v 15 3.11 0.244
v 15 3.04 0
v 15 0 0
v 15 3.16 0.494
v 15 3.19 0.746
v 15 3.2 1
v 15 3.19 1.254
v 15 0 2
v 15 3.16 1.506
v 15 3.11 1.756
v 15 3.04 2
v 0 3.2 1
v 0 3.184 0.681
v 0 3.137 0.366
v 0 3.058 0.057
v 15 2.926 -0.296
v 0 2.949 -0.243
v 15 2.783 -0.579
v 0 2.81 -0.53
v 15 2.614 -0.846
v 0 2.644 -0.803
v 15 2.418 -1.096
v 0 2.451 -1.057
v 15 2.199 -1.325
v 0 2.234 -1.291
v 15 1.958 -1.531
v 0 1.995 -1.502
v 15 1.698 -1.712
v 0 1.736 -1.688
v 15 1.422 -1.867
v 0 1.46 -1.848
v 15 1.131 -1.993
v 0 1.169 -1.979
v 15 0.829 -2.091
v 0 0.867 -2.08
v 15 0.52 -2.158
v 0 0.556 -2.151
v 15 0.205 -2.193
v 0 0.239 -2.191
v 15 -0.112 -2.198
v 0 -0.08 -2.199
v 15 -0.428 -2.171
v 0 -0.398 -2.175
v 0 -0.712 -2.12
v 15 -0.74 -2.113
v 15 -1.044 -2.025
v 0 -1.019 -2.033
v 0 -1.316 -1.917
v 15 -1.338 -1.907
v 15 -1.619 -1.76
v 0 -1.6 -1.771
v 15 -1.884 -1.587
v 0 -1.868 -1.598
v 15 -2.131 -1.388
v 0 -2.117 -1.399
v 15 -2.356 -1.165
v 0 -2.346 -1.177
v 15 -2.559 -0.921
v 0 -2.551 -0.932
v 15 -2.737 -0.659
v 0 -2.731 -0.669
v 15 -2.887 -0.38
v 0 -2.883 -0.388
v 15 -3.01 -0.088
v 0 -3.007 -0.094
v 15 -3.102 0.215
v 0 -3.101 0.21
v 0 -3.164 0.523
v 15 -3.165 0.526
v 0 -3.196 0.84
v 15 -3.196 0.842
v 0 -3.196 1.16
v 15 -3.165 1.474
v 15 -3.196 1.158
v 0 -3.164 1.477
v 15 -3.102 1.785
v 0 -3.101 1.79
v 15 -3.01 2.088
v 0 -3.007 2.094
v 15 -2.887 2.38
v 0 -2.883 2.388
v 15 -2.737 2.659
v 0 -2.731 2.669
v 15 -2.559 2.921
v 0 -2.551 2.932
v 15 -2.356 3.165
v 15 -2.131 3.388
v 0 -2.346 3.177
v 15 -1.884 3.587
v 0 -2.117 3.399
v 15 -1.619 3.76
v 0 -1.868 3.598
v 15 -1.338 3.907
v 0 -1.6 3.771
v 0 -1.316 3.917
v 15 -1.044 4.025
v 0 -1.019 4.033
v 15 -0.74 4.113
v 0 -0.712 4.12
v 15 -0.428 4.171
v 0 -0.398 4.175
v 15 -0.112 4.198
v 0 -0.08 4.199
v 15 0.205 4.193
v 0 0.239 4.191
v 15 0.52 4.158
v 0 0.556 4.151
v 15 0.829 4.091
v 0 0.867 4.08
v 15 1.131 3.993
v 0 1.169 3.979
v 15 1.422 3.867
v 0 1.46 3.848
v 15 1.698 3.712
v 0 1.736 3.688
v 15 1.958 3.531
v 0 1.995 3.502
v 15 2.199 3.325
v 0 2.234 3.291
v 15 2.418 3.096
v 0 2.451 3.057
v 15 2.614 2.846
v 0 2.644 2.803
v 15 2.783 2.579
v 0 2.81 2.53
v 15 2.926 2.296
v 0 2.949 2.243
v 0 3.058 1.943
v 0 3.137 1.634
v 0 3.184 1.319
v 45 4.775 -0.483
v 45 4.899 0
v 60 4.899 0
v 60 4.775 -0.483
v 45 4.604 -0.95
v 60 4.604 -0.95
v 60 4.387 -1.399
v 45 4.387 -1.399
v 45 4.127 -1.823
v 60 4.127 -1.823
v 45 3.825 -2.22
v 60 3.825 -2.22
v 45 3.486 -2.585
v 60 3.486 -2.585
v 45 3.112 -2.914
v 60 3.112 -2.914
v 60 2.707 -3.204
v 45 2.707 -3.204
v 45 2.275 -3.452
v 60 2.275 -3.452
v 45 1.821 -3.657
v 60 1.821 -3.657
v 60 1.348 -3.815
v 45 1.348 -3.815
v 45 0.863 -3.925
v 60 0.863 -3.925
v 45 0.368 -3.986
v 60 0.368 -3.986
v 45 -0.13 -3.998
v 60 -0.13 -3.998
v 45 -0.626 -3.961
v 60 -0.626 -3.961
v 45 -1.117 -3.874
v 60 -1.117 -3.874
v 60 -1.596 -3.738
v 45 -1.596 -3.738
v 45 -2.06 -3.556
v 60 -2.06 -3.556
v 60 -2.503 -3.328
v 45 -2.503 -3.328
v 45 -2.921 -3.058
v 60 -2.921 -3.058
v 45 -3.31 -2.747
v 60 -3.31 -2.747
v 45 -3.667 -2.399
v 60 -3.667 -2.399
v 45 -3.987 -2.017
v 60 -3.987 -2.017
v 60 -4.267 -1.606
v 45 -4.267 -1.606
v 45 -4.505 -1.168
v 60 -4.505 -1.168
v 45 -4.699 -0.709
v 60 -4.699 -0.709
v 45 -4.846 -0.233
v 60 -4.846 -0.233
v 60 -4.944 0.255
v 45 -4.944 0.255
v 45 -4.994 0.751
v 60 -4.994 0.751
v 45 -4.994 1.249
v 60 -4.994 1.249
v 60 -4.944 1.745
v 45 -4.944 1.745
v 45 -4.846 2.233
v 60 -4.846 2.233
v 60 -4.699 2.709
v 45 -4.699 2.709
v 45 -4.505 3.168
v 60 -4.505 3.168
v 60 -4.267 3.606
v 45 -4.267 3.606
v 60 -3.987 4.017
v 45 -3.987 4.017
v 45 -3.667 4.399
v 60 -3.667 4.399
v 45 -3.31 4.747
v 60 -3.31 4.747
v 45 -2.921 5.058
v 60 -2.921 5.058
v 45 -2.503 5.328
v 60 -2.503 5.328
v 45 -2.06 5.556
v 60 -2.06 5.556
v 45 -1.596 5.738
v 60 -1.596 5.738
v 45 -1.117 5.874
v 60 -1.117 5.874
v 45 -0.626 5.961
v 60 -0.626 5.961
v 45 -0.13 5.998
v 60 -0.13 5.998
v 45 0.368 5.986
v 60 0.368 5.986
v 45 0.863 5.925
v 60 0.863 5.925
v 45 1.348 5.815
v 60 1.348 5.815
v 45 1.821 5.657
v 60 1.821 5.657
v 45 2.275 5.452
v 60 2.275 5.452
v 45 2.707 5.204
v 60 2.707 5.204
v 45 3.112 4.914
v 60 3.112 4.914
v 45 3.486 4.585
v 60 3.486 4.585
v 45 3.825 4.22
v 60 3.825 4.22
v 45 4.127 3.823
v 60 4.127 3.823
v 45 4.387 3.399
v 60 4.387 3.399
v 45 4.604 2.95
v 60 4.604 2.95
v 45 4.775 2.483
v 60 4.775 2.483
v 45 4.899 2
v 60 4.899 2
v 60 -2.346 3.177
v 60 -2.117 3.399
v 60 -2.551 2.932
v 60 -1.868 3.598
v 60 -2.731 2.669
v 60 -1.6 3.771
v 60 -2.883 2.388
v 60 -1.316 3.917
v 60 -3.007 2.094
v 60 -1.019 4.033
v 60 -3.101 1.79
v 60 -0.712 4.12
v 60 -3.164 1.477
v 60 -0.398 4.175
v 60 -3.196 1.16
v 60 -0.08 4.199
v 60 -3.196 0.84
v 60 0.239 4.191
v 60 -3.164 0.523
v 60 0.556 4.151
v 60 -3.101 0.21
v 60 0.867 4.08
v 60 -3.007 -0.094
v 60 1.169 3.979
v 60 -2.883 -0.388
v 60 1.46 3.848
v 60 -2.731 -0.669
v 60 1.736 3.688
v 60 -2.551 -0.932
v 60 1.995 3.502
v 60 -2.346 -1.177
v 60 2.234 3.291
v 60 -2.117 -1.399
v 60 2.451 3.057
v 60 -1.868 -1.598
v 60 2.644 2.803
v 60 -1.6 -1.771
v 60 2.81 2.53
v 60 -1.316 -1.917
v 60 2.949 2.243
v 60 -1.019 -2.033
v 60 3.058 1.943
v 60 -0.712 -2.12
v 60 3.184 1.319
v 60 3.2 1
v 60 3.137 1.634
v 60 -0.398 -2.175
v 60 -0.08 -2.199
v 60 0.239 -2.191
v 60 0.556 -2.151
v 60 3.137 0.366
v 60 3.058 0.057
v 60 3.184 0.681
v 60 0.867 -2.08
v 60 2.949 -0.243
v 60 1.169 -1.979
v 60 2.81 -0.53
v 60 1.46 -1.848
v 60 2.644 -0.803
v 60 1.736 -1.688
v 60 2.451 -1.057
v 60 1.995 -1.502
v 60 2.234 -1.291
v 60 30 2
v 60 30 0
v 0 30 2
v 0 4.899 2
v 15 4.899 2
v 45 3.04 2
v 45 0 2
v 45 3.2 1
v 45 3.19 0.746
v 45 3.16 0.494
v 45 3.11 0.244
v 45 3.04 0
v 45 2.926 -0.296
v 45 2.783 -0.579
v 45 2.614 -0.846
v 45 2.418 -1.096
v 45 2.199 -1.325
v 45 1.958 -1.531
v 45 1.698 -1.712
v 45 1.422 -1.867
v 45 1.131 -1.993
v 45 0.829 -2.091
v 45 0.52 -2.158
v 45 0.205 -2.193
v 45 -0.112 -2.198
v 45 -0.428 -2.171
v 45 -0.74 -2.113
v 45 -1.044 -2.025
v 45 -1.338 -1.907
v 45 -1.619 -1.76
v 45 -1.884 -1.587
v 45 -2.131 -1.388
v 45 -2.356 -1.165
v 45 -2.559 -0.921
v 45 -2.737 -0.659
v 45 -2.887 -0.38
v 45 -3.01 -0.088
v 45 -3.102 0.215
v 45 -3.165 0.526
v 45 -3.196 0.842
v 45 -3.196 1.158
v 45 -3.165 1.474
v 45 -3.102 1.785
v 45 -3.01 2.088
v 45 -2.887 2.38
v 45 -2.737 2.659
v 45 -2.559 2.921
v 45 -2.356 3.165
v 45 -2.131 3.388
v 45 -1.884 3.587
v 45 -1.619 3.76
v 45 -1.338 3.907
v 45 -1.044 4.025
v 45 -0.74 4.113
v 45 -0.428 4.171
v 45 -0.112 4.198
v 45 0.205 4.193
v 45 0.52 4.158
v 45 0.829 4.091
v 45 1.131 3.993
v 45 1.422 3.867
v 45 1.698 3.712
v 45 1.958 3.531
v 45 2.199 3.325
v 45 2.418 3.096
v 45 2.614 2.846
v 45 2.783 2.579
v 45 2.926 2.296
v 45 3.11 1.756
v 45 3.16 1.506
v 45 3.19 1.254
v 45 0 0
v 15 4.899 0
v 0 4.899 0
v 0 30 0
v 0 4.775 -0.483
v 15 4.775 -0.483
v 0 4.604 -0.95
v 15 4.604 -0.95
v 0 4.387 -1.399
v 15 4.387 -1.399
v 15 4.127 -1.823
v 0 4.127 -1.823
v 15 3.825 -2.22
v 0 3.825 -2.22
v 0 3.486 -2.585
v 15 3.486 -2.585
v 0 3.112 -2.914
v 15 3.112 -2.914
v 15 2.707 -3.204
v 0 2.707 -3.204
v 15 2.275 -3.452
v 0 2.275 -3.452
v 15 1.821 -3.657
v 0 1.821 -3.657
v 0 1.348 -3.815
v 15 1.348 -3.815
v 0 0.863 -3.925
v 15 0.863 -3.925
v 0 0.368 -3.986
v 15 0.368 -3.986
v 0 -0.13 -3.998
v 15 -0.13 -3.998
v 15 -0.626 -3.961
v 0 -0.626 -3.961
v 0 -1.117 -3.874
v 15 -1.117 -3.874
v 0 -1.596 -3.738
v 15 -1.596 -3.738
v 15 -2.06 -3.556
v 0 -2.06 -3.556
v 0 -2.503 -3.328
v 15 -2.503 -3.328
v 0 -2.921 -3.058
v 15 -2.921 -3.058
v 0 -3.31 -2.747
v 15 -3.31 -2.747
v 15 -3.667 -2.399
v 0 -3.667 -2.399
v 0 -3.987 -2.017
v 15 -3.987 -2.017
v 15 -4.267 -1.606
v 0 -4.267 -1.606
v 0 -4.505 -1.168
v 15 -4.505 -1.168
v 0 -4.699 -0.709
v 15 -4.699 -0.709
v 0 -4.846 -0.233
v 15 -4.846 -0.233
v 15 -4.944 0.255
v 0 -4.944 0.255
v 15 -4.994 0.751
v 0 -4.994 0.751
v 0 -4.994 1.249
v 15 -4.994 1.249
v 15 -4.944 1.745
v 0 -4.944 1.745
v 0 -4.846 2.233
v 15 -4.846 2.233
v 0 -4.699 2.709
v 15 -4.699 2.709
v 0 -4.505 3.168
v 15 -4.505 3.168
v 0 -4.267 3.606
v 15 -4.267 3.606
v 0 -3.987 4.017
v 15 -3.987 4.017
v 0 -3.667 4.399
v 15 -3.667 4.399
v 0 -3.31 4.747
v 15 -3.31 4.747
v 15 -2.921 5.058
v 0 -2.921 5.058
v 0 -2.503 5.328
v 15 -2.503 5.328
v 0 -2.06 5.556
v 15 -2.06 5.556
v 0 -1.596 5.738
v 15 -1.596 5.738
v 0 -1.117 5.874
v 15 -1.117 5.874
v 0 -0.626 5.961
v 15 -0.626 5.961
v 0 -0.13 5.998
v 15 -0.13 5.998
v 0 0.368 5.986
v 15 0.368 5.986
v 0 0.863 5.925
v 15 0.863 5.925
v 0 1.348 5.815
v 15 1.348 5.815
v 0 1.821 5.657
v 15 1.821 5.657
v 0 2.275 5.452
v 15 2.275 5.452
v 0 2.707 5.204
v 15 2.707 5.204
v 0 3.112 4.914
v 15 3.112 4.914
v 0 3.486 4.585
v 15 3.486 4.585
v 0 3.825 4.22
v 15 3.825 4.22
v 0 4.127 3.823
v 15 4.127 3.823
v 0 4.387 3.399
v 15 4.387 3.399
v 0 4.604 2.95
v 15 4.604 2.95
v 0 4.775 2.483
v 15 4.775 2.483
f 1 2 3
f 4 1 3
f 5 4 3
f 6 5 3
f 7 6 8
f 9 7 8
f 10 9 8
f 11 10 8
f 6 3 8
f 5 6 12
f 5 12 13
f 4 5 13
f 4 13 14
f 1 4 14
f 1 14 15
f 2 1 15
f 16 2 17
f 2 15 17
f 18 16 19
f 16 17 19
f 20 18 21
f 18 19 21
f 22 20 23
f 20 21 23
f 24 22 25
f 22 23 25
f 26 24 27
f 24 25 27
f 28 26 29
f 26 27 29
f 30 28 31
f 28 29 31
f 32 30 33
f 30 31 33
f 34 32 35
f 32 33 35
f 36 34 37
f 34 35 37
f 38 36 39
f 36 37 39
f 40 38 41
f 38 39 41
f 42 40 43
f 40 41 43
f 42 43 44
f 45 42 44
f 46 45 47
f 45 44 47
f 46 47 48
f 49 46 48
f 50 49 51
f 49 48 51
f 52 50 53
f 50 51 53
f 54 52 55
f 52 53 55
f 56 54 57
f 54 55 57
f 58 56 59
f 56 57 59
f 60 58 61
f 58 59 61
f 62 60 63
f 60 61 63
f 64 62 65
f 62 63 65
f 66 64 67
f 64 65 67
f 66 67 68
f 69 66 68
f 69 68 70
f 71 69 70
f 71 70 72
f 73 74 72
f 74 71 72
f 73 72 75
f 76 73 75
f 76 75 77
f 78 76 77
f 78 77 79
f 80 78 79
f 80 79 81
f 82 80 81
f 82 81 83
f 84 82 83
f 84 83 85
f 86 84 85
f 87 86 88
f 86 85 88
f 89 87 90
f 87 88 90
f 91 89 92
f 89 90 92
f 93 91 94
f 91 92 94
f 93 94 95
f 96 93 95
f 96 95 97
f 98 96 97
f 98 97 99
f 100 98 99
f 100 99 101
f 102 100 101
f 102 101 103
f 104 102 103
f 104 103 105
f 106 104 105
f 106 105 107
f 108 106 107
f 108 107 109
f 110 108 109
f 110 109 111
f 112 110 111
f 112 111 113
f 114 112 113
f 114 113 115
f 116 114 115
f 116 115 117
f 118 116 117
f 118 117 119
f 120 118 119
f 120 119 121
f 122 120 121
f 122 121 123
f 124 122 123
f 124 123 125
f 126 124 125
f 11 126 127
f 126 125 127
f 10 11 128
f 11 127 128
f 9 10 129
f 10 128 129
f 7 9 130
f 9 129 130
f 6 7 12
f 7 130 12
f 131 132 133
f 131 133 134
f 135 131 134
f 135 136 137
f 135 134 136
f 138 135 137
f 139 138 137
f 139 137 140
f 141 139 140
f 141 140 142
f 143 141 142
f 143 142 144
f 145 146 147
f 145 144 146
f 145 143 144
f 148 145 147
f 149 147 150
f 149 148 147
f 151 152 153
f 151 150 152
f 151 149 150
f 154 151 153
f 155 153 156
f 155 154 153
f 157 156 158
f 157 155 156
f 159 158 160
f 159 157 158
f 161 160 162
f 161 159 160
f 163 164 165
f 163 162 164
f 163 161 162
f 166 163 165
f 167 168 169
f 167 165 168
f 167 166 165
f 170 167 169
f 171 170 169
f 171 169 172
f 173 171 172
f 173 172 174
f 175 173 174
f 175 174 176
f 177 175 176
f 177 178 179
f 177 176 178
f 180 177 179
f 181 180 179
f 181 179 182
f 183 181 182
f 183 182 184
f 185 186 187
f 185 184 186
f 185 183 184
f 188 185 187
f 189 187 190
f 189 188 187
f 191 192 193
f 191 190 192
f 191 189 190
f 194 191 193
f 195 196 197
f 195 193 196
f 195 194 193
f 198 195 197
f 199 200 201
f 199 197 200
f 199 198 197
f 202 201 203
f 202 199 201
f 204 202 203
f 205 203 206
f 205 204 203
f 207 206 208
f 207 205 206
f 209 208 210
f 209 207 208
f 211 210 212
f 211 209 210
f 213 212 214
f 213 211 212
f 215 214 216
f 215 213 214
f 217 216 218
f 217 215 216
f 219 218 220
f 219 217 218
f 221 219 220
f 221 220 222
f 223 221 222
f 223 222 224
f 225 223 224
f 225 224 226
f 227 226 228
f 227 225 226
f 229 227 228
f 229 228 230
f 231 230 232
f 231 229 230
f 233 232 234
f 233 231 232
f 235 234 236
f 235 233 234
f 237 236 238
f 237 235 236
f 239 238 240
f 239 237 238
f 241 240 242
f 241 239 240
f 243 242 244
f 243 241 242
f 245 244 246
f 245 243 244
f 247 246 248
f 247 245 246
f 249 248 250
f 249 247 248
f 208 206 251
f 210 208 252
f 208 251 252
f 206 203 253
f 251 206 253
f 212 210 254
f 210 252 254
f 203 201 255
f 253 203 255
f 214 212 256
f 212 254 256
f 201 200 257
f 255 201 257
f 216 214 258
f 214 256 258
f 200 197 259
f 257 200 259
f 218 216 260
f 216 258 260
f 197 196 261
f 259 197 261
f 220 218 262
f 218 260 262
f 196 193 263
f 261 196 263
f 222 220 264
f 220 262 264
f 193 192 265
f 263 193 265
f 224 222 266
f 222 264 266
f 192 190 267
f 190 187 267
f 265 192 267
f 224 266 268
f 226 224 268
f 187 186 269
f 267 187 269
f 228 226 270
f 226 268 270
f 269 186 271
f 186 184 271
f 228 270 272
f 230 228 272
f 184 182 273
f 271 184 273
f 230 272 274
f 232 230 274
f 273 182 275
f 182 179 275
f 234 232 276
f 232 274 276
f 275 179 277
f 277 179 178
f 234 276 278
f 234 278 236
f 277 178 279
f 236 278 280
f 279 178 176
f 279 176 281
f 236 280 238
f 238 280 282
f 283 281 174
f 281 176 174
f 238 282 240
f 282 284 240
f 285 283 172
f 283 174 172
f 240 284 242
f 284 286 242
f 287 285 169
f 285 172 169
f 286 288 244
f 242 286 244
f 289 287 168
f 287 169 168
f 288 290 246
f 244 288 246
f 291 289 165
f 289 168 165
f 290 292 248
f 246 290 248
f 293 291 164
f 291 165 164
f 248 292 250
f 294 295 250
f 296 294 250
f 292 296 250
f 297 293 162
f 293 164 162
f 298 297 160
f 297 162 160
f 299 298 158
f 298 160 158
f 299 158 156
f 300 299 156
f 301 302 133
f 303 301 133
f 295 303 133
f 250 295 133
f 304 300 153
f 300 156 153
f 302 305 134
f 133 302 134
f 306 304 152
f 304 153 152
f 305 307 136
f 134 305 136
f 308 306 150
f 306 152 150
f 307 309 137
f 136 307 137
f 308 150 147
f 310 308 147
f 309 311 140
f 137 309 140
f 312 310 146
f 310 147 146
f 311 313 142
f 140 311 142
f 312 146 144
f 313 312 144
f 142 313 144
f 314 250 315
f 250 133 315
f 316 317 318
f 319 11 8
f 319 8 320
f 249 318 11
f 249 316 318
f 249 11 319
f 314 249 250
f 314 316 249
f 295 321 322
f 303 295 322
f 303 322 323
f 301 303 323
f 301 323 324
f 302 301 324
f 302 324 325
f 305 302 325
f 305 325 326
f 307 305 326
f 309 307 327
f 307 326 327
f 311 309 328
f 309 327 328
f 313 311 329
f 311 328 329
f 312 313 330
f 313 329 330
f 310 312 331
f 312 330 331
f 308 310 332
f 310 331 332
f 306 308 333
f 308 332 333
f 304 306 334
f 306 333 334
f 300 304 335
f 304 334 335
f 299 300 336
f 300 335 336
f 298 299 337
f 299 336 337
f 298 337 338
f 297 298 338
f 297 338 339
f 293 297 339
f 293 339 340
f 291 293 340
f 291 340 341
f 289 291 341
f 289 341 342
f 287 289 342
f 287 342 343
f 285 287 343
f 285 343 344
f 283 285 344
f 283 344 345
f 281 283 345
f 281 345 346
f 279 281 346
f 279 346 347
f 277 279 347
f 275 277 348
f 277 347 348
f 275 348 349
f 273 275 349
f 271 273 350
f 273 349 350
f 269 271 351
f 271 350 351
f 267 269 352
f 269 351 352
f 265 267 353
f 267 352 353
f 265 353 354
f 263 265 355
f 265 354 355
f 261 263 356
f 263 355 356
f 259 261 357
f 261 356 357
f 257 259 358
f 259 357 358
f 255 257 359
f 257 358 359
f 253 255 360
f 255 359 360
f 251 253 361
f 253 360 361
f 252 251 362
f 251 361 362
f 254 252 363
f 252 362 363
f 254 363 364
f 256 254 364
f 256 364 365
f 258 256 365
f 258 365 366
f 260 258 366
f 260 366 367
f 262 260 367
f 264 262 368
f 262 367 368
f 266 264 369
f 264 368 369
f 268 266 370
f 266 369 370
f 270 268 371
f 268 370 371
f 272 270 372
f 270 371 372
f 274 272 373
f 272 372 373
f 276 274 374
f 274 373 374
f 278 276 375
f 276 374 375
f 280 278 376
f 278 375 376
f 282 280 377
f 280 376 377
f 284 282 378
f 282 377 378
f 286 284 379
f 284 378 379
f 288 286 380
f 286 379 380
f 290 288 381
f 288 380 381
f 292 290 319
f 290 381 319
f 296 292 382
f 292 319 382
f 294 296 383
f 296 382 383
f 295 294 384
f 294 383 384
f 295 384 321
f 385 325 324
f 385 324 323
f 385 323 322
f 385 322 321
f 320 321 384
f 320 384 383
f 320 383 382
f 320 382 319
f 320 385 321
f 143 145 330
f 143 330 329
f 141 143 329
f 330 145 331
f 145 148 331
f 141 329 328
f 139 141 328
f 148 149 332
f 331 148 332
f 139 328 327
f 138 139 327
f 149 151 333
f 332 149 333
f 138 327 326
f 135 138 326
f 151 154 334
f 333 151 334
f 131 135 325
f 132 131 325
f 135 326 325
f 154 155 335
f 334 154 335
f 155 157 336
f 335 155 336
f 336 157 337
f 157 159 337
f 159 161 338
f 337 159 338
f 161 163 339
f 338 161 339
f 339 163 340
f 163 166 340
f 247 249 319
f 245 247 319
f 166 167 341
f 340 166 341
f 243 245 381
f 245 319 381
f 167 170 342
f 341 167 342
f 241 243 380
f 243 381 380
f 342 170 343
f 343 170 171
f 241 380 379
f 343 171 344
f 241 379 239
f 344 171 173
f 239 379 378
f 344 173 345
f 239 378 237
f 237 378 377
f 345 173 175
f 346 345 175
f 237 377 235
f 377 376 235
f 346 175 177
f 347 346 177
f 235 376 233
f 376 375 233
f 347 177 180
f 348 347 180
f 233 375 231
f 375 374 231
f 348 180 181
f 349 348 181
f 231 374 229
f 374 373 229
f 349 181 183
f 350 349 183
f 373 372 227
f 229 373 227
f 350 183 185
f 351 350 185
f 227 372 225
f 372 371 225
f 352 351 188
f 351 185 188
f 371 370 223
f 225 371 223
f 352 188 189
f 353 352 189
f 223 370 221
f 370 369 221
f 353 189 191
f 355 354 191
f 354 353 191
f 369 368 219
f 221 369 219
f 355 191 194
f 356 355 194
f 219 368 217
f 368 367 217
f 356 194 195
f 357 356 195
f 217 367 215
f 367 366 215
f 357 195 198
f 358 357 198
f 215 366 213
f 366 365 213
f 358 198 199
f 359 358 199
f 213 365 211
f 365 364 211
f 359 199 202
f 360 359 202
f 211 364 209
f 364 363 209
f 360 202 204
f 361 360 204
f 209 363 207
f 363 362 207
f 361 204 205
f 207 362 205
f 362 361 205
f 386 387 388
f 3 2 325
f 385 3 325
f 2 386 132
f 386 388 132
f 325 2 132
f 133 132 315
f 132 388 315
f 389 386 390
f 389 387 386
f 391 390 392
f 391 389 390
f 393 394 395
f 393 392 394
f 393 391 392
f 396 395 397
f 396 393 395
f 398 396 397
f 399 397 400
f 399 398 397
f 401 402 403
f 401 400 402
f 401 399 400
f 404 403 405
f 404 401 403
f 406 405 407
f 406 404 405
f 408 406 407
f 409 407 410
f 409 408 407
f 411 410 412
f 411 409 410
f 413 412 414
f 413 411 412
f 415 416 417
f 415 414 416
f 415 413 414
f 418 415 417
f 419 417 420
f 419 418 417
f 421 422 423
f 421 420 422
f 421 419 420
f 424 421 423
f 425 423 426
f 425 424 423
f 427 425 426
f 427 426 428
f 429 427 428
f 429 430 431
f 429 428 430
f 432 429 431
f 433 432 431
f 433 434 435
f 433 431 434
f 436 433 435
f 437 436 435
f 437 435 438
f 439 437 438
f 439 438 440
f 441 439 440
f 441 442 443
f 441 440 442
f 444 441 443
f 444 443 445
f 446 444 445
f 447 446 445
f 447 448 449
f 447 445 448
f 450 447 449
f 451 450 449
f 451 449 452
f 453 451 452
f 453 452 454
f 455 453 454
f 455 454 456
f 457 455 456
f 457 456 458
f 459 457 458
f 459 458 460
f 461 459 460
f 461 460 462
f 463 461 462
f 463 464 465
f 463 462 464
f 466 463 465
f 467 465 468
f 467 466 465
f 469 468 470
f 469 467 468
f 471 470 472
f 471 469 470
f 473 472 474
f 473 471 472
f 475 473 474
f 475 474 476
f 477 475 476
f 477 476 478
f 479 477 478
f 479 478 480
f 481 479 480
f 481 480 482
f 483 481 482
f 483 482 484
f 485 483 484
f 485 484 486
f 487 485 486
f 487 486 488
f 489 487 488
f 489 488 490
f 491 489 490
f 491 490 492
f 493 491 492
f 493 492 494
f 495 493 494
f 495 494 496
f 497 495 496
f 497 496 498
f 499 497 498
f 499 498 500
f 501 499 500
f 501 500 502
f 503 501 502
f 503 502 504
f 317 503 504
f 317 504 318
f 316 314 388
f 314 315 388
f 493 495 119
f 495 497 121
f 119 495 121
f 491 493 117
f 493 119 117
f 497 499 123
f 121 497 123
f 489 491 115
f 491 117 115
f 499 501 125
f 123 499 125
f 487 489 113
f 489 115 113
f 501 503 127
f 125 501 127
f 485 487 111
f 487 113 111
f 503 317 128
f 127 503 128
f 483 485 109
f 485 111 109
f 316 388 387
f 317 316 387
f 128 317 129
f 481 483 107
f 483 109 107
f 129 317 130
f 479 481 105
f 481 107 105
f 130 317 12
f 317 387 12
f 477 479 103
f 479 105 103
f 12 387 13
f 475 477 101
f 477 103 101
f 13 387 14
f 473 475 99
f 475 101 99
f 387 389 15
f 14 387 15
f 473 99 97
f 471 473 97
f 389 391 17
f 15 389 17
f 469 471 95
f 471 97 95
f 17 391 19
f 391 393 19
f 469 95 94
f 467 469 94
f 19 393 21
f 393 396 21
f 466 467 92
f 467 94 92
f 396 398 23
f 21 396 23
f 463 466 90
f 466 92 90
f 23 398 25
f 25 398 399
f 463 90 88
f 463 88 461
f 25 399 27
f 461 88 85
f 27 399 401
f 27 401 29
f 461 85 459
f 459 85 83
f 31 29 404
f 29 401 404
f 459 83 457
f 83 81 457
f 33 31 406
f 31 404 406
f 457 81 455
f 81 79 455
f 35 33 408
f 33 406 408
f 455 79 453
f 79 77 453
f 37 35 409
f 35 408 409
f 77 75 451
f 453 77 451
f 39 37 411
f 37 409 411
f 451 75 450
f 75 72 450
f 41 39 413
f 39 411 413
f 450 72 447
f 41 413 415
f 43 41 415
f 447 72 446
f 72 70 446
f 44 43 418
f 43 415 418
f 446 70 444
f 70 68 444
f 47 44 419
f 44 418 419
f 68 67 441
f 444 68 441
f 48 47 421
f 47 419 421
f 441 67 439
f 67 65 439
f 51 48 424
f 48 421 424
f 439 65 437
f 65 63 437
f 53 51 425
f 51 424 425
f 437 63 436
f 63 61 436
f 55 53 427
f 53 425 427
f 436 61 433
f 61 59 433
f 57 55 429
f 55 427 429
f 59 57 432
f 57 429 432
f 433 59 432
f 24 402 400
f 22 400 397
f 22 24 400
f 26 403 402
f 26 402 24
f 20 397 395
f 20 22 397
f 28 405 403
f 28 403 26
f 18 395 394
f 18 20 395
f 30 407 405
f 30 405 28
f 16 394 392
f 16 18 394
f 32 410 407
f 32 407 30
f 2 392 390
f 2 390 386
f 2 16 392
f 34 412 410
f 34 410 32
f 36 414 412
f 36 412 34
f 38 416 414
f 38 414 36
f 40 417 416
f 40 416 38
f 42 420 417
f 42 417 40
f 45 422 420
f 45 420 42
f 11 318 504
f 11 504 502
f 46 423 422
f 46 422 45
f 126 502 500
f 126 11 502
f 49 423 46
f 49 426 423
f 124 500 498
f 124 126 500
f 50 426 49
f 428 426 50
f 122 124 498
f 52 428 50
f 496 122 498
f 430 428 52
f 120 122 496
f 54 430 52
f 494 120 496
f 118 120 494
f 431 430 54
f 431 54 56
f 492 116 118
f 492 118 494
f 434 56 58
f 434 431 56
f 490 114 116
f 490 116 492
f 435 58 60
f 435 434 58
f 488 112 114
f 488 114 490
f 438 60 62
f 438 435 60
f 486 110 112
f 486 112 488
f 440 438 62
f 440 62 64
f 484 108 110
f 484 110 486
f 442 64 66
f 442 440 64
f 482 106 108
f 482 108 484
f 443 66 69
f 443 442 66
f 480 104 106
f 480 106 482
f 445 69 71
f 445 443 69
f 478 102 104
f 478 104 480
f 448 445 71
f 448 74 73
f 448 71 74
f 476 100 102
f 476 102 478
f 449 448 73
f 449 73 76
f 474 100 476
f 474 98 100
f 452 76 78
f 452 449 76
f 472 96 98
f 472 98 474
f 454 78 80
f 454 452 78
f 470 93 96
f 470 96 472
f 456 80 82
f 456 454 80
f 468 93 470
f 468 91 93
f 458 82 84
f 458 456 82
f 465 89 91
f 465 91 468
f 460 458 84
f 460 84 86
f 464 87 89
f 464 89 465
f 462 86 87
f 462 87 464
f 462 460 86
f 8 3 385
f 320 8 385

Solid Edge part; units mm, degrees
sketch "Sketch1" plane through (0, 0, 0) normal (0, 0, 1) x (1, 0, 0)
  line L0 (0, 0) -> (60, 0)
  line L1 (60, 0) -> (60, 30)
  line L2 (60, 30) -> (0, 30)
  line L3 (0, 30) -> (0, 0)
extrude "Protrusion1" add sketch "Sketch1" along normal blind 2
sketch "Sketch2" plane through (0, 0, 0) normal (1, 0, 0) x (0, 1, 0)
  circle A0 centre (0, 1) radius 5
extrude "拉伸_2" add sketch "Sketch2" along normal blind 15
sketch "Sketch3" plane through (45, 0, 0) normal (1, 0, 0) x (0, 1, 0)
  circle A0 centre (0, 1) radius 5
extrude "拉伸_3" add sketch "Sketch3" along normal blind 15
sketch "Sketch4" plane through (0, 0, 0) normal (1, 0, 0) x (0, 1, 0)
  circle A0 centre (0, 1) radius 3.2
extrude "拉伸除料_1" cut sketch "Sketch4" along normal blind 15
sketch "Sketch5" plane through (45, 0, 0) normal (1, 0, 0) x (0, 1, 0)
  circle A0 centre (0, 1) radius 3.2
extrude "拉伸除料_2" cut sketch "Sketch5" along normal blind 15
